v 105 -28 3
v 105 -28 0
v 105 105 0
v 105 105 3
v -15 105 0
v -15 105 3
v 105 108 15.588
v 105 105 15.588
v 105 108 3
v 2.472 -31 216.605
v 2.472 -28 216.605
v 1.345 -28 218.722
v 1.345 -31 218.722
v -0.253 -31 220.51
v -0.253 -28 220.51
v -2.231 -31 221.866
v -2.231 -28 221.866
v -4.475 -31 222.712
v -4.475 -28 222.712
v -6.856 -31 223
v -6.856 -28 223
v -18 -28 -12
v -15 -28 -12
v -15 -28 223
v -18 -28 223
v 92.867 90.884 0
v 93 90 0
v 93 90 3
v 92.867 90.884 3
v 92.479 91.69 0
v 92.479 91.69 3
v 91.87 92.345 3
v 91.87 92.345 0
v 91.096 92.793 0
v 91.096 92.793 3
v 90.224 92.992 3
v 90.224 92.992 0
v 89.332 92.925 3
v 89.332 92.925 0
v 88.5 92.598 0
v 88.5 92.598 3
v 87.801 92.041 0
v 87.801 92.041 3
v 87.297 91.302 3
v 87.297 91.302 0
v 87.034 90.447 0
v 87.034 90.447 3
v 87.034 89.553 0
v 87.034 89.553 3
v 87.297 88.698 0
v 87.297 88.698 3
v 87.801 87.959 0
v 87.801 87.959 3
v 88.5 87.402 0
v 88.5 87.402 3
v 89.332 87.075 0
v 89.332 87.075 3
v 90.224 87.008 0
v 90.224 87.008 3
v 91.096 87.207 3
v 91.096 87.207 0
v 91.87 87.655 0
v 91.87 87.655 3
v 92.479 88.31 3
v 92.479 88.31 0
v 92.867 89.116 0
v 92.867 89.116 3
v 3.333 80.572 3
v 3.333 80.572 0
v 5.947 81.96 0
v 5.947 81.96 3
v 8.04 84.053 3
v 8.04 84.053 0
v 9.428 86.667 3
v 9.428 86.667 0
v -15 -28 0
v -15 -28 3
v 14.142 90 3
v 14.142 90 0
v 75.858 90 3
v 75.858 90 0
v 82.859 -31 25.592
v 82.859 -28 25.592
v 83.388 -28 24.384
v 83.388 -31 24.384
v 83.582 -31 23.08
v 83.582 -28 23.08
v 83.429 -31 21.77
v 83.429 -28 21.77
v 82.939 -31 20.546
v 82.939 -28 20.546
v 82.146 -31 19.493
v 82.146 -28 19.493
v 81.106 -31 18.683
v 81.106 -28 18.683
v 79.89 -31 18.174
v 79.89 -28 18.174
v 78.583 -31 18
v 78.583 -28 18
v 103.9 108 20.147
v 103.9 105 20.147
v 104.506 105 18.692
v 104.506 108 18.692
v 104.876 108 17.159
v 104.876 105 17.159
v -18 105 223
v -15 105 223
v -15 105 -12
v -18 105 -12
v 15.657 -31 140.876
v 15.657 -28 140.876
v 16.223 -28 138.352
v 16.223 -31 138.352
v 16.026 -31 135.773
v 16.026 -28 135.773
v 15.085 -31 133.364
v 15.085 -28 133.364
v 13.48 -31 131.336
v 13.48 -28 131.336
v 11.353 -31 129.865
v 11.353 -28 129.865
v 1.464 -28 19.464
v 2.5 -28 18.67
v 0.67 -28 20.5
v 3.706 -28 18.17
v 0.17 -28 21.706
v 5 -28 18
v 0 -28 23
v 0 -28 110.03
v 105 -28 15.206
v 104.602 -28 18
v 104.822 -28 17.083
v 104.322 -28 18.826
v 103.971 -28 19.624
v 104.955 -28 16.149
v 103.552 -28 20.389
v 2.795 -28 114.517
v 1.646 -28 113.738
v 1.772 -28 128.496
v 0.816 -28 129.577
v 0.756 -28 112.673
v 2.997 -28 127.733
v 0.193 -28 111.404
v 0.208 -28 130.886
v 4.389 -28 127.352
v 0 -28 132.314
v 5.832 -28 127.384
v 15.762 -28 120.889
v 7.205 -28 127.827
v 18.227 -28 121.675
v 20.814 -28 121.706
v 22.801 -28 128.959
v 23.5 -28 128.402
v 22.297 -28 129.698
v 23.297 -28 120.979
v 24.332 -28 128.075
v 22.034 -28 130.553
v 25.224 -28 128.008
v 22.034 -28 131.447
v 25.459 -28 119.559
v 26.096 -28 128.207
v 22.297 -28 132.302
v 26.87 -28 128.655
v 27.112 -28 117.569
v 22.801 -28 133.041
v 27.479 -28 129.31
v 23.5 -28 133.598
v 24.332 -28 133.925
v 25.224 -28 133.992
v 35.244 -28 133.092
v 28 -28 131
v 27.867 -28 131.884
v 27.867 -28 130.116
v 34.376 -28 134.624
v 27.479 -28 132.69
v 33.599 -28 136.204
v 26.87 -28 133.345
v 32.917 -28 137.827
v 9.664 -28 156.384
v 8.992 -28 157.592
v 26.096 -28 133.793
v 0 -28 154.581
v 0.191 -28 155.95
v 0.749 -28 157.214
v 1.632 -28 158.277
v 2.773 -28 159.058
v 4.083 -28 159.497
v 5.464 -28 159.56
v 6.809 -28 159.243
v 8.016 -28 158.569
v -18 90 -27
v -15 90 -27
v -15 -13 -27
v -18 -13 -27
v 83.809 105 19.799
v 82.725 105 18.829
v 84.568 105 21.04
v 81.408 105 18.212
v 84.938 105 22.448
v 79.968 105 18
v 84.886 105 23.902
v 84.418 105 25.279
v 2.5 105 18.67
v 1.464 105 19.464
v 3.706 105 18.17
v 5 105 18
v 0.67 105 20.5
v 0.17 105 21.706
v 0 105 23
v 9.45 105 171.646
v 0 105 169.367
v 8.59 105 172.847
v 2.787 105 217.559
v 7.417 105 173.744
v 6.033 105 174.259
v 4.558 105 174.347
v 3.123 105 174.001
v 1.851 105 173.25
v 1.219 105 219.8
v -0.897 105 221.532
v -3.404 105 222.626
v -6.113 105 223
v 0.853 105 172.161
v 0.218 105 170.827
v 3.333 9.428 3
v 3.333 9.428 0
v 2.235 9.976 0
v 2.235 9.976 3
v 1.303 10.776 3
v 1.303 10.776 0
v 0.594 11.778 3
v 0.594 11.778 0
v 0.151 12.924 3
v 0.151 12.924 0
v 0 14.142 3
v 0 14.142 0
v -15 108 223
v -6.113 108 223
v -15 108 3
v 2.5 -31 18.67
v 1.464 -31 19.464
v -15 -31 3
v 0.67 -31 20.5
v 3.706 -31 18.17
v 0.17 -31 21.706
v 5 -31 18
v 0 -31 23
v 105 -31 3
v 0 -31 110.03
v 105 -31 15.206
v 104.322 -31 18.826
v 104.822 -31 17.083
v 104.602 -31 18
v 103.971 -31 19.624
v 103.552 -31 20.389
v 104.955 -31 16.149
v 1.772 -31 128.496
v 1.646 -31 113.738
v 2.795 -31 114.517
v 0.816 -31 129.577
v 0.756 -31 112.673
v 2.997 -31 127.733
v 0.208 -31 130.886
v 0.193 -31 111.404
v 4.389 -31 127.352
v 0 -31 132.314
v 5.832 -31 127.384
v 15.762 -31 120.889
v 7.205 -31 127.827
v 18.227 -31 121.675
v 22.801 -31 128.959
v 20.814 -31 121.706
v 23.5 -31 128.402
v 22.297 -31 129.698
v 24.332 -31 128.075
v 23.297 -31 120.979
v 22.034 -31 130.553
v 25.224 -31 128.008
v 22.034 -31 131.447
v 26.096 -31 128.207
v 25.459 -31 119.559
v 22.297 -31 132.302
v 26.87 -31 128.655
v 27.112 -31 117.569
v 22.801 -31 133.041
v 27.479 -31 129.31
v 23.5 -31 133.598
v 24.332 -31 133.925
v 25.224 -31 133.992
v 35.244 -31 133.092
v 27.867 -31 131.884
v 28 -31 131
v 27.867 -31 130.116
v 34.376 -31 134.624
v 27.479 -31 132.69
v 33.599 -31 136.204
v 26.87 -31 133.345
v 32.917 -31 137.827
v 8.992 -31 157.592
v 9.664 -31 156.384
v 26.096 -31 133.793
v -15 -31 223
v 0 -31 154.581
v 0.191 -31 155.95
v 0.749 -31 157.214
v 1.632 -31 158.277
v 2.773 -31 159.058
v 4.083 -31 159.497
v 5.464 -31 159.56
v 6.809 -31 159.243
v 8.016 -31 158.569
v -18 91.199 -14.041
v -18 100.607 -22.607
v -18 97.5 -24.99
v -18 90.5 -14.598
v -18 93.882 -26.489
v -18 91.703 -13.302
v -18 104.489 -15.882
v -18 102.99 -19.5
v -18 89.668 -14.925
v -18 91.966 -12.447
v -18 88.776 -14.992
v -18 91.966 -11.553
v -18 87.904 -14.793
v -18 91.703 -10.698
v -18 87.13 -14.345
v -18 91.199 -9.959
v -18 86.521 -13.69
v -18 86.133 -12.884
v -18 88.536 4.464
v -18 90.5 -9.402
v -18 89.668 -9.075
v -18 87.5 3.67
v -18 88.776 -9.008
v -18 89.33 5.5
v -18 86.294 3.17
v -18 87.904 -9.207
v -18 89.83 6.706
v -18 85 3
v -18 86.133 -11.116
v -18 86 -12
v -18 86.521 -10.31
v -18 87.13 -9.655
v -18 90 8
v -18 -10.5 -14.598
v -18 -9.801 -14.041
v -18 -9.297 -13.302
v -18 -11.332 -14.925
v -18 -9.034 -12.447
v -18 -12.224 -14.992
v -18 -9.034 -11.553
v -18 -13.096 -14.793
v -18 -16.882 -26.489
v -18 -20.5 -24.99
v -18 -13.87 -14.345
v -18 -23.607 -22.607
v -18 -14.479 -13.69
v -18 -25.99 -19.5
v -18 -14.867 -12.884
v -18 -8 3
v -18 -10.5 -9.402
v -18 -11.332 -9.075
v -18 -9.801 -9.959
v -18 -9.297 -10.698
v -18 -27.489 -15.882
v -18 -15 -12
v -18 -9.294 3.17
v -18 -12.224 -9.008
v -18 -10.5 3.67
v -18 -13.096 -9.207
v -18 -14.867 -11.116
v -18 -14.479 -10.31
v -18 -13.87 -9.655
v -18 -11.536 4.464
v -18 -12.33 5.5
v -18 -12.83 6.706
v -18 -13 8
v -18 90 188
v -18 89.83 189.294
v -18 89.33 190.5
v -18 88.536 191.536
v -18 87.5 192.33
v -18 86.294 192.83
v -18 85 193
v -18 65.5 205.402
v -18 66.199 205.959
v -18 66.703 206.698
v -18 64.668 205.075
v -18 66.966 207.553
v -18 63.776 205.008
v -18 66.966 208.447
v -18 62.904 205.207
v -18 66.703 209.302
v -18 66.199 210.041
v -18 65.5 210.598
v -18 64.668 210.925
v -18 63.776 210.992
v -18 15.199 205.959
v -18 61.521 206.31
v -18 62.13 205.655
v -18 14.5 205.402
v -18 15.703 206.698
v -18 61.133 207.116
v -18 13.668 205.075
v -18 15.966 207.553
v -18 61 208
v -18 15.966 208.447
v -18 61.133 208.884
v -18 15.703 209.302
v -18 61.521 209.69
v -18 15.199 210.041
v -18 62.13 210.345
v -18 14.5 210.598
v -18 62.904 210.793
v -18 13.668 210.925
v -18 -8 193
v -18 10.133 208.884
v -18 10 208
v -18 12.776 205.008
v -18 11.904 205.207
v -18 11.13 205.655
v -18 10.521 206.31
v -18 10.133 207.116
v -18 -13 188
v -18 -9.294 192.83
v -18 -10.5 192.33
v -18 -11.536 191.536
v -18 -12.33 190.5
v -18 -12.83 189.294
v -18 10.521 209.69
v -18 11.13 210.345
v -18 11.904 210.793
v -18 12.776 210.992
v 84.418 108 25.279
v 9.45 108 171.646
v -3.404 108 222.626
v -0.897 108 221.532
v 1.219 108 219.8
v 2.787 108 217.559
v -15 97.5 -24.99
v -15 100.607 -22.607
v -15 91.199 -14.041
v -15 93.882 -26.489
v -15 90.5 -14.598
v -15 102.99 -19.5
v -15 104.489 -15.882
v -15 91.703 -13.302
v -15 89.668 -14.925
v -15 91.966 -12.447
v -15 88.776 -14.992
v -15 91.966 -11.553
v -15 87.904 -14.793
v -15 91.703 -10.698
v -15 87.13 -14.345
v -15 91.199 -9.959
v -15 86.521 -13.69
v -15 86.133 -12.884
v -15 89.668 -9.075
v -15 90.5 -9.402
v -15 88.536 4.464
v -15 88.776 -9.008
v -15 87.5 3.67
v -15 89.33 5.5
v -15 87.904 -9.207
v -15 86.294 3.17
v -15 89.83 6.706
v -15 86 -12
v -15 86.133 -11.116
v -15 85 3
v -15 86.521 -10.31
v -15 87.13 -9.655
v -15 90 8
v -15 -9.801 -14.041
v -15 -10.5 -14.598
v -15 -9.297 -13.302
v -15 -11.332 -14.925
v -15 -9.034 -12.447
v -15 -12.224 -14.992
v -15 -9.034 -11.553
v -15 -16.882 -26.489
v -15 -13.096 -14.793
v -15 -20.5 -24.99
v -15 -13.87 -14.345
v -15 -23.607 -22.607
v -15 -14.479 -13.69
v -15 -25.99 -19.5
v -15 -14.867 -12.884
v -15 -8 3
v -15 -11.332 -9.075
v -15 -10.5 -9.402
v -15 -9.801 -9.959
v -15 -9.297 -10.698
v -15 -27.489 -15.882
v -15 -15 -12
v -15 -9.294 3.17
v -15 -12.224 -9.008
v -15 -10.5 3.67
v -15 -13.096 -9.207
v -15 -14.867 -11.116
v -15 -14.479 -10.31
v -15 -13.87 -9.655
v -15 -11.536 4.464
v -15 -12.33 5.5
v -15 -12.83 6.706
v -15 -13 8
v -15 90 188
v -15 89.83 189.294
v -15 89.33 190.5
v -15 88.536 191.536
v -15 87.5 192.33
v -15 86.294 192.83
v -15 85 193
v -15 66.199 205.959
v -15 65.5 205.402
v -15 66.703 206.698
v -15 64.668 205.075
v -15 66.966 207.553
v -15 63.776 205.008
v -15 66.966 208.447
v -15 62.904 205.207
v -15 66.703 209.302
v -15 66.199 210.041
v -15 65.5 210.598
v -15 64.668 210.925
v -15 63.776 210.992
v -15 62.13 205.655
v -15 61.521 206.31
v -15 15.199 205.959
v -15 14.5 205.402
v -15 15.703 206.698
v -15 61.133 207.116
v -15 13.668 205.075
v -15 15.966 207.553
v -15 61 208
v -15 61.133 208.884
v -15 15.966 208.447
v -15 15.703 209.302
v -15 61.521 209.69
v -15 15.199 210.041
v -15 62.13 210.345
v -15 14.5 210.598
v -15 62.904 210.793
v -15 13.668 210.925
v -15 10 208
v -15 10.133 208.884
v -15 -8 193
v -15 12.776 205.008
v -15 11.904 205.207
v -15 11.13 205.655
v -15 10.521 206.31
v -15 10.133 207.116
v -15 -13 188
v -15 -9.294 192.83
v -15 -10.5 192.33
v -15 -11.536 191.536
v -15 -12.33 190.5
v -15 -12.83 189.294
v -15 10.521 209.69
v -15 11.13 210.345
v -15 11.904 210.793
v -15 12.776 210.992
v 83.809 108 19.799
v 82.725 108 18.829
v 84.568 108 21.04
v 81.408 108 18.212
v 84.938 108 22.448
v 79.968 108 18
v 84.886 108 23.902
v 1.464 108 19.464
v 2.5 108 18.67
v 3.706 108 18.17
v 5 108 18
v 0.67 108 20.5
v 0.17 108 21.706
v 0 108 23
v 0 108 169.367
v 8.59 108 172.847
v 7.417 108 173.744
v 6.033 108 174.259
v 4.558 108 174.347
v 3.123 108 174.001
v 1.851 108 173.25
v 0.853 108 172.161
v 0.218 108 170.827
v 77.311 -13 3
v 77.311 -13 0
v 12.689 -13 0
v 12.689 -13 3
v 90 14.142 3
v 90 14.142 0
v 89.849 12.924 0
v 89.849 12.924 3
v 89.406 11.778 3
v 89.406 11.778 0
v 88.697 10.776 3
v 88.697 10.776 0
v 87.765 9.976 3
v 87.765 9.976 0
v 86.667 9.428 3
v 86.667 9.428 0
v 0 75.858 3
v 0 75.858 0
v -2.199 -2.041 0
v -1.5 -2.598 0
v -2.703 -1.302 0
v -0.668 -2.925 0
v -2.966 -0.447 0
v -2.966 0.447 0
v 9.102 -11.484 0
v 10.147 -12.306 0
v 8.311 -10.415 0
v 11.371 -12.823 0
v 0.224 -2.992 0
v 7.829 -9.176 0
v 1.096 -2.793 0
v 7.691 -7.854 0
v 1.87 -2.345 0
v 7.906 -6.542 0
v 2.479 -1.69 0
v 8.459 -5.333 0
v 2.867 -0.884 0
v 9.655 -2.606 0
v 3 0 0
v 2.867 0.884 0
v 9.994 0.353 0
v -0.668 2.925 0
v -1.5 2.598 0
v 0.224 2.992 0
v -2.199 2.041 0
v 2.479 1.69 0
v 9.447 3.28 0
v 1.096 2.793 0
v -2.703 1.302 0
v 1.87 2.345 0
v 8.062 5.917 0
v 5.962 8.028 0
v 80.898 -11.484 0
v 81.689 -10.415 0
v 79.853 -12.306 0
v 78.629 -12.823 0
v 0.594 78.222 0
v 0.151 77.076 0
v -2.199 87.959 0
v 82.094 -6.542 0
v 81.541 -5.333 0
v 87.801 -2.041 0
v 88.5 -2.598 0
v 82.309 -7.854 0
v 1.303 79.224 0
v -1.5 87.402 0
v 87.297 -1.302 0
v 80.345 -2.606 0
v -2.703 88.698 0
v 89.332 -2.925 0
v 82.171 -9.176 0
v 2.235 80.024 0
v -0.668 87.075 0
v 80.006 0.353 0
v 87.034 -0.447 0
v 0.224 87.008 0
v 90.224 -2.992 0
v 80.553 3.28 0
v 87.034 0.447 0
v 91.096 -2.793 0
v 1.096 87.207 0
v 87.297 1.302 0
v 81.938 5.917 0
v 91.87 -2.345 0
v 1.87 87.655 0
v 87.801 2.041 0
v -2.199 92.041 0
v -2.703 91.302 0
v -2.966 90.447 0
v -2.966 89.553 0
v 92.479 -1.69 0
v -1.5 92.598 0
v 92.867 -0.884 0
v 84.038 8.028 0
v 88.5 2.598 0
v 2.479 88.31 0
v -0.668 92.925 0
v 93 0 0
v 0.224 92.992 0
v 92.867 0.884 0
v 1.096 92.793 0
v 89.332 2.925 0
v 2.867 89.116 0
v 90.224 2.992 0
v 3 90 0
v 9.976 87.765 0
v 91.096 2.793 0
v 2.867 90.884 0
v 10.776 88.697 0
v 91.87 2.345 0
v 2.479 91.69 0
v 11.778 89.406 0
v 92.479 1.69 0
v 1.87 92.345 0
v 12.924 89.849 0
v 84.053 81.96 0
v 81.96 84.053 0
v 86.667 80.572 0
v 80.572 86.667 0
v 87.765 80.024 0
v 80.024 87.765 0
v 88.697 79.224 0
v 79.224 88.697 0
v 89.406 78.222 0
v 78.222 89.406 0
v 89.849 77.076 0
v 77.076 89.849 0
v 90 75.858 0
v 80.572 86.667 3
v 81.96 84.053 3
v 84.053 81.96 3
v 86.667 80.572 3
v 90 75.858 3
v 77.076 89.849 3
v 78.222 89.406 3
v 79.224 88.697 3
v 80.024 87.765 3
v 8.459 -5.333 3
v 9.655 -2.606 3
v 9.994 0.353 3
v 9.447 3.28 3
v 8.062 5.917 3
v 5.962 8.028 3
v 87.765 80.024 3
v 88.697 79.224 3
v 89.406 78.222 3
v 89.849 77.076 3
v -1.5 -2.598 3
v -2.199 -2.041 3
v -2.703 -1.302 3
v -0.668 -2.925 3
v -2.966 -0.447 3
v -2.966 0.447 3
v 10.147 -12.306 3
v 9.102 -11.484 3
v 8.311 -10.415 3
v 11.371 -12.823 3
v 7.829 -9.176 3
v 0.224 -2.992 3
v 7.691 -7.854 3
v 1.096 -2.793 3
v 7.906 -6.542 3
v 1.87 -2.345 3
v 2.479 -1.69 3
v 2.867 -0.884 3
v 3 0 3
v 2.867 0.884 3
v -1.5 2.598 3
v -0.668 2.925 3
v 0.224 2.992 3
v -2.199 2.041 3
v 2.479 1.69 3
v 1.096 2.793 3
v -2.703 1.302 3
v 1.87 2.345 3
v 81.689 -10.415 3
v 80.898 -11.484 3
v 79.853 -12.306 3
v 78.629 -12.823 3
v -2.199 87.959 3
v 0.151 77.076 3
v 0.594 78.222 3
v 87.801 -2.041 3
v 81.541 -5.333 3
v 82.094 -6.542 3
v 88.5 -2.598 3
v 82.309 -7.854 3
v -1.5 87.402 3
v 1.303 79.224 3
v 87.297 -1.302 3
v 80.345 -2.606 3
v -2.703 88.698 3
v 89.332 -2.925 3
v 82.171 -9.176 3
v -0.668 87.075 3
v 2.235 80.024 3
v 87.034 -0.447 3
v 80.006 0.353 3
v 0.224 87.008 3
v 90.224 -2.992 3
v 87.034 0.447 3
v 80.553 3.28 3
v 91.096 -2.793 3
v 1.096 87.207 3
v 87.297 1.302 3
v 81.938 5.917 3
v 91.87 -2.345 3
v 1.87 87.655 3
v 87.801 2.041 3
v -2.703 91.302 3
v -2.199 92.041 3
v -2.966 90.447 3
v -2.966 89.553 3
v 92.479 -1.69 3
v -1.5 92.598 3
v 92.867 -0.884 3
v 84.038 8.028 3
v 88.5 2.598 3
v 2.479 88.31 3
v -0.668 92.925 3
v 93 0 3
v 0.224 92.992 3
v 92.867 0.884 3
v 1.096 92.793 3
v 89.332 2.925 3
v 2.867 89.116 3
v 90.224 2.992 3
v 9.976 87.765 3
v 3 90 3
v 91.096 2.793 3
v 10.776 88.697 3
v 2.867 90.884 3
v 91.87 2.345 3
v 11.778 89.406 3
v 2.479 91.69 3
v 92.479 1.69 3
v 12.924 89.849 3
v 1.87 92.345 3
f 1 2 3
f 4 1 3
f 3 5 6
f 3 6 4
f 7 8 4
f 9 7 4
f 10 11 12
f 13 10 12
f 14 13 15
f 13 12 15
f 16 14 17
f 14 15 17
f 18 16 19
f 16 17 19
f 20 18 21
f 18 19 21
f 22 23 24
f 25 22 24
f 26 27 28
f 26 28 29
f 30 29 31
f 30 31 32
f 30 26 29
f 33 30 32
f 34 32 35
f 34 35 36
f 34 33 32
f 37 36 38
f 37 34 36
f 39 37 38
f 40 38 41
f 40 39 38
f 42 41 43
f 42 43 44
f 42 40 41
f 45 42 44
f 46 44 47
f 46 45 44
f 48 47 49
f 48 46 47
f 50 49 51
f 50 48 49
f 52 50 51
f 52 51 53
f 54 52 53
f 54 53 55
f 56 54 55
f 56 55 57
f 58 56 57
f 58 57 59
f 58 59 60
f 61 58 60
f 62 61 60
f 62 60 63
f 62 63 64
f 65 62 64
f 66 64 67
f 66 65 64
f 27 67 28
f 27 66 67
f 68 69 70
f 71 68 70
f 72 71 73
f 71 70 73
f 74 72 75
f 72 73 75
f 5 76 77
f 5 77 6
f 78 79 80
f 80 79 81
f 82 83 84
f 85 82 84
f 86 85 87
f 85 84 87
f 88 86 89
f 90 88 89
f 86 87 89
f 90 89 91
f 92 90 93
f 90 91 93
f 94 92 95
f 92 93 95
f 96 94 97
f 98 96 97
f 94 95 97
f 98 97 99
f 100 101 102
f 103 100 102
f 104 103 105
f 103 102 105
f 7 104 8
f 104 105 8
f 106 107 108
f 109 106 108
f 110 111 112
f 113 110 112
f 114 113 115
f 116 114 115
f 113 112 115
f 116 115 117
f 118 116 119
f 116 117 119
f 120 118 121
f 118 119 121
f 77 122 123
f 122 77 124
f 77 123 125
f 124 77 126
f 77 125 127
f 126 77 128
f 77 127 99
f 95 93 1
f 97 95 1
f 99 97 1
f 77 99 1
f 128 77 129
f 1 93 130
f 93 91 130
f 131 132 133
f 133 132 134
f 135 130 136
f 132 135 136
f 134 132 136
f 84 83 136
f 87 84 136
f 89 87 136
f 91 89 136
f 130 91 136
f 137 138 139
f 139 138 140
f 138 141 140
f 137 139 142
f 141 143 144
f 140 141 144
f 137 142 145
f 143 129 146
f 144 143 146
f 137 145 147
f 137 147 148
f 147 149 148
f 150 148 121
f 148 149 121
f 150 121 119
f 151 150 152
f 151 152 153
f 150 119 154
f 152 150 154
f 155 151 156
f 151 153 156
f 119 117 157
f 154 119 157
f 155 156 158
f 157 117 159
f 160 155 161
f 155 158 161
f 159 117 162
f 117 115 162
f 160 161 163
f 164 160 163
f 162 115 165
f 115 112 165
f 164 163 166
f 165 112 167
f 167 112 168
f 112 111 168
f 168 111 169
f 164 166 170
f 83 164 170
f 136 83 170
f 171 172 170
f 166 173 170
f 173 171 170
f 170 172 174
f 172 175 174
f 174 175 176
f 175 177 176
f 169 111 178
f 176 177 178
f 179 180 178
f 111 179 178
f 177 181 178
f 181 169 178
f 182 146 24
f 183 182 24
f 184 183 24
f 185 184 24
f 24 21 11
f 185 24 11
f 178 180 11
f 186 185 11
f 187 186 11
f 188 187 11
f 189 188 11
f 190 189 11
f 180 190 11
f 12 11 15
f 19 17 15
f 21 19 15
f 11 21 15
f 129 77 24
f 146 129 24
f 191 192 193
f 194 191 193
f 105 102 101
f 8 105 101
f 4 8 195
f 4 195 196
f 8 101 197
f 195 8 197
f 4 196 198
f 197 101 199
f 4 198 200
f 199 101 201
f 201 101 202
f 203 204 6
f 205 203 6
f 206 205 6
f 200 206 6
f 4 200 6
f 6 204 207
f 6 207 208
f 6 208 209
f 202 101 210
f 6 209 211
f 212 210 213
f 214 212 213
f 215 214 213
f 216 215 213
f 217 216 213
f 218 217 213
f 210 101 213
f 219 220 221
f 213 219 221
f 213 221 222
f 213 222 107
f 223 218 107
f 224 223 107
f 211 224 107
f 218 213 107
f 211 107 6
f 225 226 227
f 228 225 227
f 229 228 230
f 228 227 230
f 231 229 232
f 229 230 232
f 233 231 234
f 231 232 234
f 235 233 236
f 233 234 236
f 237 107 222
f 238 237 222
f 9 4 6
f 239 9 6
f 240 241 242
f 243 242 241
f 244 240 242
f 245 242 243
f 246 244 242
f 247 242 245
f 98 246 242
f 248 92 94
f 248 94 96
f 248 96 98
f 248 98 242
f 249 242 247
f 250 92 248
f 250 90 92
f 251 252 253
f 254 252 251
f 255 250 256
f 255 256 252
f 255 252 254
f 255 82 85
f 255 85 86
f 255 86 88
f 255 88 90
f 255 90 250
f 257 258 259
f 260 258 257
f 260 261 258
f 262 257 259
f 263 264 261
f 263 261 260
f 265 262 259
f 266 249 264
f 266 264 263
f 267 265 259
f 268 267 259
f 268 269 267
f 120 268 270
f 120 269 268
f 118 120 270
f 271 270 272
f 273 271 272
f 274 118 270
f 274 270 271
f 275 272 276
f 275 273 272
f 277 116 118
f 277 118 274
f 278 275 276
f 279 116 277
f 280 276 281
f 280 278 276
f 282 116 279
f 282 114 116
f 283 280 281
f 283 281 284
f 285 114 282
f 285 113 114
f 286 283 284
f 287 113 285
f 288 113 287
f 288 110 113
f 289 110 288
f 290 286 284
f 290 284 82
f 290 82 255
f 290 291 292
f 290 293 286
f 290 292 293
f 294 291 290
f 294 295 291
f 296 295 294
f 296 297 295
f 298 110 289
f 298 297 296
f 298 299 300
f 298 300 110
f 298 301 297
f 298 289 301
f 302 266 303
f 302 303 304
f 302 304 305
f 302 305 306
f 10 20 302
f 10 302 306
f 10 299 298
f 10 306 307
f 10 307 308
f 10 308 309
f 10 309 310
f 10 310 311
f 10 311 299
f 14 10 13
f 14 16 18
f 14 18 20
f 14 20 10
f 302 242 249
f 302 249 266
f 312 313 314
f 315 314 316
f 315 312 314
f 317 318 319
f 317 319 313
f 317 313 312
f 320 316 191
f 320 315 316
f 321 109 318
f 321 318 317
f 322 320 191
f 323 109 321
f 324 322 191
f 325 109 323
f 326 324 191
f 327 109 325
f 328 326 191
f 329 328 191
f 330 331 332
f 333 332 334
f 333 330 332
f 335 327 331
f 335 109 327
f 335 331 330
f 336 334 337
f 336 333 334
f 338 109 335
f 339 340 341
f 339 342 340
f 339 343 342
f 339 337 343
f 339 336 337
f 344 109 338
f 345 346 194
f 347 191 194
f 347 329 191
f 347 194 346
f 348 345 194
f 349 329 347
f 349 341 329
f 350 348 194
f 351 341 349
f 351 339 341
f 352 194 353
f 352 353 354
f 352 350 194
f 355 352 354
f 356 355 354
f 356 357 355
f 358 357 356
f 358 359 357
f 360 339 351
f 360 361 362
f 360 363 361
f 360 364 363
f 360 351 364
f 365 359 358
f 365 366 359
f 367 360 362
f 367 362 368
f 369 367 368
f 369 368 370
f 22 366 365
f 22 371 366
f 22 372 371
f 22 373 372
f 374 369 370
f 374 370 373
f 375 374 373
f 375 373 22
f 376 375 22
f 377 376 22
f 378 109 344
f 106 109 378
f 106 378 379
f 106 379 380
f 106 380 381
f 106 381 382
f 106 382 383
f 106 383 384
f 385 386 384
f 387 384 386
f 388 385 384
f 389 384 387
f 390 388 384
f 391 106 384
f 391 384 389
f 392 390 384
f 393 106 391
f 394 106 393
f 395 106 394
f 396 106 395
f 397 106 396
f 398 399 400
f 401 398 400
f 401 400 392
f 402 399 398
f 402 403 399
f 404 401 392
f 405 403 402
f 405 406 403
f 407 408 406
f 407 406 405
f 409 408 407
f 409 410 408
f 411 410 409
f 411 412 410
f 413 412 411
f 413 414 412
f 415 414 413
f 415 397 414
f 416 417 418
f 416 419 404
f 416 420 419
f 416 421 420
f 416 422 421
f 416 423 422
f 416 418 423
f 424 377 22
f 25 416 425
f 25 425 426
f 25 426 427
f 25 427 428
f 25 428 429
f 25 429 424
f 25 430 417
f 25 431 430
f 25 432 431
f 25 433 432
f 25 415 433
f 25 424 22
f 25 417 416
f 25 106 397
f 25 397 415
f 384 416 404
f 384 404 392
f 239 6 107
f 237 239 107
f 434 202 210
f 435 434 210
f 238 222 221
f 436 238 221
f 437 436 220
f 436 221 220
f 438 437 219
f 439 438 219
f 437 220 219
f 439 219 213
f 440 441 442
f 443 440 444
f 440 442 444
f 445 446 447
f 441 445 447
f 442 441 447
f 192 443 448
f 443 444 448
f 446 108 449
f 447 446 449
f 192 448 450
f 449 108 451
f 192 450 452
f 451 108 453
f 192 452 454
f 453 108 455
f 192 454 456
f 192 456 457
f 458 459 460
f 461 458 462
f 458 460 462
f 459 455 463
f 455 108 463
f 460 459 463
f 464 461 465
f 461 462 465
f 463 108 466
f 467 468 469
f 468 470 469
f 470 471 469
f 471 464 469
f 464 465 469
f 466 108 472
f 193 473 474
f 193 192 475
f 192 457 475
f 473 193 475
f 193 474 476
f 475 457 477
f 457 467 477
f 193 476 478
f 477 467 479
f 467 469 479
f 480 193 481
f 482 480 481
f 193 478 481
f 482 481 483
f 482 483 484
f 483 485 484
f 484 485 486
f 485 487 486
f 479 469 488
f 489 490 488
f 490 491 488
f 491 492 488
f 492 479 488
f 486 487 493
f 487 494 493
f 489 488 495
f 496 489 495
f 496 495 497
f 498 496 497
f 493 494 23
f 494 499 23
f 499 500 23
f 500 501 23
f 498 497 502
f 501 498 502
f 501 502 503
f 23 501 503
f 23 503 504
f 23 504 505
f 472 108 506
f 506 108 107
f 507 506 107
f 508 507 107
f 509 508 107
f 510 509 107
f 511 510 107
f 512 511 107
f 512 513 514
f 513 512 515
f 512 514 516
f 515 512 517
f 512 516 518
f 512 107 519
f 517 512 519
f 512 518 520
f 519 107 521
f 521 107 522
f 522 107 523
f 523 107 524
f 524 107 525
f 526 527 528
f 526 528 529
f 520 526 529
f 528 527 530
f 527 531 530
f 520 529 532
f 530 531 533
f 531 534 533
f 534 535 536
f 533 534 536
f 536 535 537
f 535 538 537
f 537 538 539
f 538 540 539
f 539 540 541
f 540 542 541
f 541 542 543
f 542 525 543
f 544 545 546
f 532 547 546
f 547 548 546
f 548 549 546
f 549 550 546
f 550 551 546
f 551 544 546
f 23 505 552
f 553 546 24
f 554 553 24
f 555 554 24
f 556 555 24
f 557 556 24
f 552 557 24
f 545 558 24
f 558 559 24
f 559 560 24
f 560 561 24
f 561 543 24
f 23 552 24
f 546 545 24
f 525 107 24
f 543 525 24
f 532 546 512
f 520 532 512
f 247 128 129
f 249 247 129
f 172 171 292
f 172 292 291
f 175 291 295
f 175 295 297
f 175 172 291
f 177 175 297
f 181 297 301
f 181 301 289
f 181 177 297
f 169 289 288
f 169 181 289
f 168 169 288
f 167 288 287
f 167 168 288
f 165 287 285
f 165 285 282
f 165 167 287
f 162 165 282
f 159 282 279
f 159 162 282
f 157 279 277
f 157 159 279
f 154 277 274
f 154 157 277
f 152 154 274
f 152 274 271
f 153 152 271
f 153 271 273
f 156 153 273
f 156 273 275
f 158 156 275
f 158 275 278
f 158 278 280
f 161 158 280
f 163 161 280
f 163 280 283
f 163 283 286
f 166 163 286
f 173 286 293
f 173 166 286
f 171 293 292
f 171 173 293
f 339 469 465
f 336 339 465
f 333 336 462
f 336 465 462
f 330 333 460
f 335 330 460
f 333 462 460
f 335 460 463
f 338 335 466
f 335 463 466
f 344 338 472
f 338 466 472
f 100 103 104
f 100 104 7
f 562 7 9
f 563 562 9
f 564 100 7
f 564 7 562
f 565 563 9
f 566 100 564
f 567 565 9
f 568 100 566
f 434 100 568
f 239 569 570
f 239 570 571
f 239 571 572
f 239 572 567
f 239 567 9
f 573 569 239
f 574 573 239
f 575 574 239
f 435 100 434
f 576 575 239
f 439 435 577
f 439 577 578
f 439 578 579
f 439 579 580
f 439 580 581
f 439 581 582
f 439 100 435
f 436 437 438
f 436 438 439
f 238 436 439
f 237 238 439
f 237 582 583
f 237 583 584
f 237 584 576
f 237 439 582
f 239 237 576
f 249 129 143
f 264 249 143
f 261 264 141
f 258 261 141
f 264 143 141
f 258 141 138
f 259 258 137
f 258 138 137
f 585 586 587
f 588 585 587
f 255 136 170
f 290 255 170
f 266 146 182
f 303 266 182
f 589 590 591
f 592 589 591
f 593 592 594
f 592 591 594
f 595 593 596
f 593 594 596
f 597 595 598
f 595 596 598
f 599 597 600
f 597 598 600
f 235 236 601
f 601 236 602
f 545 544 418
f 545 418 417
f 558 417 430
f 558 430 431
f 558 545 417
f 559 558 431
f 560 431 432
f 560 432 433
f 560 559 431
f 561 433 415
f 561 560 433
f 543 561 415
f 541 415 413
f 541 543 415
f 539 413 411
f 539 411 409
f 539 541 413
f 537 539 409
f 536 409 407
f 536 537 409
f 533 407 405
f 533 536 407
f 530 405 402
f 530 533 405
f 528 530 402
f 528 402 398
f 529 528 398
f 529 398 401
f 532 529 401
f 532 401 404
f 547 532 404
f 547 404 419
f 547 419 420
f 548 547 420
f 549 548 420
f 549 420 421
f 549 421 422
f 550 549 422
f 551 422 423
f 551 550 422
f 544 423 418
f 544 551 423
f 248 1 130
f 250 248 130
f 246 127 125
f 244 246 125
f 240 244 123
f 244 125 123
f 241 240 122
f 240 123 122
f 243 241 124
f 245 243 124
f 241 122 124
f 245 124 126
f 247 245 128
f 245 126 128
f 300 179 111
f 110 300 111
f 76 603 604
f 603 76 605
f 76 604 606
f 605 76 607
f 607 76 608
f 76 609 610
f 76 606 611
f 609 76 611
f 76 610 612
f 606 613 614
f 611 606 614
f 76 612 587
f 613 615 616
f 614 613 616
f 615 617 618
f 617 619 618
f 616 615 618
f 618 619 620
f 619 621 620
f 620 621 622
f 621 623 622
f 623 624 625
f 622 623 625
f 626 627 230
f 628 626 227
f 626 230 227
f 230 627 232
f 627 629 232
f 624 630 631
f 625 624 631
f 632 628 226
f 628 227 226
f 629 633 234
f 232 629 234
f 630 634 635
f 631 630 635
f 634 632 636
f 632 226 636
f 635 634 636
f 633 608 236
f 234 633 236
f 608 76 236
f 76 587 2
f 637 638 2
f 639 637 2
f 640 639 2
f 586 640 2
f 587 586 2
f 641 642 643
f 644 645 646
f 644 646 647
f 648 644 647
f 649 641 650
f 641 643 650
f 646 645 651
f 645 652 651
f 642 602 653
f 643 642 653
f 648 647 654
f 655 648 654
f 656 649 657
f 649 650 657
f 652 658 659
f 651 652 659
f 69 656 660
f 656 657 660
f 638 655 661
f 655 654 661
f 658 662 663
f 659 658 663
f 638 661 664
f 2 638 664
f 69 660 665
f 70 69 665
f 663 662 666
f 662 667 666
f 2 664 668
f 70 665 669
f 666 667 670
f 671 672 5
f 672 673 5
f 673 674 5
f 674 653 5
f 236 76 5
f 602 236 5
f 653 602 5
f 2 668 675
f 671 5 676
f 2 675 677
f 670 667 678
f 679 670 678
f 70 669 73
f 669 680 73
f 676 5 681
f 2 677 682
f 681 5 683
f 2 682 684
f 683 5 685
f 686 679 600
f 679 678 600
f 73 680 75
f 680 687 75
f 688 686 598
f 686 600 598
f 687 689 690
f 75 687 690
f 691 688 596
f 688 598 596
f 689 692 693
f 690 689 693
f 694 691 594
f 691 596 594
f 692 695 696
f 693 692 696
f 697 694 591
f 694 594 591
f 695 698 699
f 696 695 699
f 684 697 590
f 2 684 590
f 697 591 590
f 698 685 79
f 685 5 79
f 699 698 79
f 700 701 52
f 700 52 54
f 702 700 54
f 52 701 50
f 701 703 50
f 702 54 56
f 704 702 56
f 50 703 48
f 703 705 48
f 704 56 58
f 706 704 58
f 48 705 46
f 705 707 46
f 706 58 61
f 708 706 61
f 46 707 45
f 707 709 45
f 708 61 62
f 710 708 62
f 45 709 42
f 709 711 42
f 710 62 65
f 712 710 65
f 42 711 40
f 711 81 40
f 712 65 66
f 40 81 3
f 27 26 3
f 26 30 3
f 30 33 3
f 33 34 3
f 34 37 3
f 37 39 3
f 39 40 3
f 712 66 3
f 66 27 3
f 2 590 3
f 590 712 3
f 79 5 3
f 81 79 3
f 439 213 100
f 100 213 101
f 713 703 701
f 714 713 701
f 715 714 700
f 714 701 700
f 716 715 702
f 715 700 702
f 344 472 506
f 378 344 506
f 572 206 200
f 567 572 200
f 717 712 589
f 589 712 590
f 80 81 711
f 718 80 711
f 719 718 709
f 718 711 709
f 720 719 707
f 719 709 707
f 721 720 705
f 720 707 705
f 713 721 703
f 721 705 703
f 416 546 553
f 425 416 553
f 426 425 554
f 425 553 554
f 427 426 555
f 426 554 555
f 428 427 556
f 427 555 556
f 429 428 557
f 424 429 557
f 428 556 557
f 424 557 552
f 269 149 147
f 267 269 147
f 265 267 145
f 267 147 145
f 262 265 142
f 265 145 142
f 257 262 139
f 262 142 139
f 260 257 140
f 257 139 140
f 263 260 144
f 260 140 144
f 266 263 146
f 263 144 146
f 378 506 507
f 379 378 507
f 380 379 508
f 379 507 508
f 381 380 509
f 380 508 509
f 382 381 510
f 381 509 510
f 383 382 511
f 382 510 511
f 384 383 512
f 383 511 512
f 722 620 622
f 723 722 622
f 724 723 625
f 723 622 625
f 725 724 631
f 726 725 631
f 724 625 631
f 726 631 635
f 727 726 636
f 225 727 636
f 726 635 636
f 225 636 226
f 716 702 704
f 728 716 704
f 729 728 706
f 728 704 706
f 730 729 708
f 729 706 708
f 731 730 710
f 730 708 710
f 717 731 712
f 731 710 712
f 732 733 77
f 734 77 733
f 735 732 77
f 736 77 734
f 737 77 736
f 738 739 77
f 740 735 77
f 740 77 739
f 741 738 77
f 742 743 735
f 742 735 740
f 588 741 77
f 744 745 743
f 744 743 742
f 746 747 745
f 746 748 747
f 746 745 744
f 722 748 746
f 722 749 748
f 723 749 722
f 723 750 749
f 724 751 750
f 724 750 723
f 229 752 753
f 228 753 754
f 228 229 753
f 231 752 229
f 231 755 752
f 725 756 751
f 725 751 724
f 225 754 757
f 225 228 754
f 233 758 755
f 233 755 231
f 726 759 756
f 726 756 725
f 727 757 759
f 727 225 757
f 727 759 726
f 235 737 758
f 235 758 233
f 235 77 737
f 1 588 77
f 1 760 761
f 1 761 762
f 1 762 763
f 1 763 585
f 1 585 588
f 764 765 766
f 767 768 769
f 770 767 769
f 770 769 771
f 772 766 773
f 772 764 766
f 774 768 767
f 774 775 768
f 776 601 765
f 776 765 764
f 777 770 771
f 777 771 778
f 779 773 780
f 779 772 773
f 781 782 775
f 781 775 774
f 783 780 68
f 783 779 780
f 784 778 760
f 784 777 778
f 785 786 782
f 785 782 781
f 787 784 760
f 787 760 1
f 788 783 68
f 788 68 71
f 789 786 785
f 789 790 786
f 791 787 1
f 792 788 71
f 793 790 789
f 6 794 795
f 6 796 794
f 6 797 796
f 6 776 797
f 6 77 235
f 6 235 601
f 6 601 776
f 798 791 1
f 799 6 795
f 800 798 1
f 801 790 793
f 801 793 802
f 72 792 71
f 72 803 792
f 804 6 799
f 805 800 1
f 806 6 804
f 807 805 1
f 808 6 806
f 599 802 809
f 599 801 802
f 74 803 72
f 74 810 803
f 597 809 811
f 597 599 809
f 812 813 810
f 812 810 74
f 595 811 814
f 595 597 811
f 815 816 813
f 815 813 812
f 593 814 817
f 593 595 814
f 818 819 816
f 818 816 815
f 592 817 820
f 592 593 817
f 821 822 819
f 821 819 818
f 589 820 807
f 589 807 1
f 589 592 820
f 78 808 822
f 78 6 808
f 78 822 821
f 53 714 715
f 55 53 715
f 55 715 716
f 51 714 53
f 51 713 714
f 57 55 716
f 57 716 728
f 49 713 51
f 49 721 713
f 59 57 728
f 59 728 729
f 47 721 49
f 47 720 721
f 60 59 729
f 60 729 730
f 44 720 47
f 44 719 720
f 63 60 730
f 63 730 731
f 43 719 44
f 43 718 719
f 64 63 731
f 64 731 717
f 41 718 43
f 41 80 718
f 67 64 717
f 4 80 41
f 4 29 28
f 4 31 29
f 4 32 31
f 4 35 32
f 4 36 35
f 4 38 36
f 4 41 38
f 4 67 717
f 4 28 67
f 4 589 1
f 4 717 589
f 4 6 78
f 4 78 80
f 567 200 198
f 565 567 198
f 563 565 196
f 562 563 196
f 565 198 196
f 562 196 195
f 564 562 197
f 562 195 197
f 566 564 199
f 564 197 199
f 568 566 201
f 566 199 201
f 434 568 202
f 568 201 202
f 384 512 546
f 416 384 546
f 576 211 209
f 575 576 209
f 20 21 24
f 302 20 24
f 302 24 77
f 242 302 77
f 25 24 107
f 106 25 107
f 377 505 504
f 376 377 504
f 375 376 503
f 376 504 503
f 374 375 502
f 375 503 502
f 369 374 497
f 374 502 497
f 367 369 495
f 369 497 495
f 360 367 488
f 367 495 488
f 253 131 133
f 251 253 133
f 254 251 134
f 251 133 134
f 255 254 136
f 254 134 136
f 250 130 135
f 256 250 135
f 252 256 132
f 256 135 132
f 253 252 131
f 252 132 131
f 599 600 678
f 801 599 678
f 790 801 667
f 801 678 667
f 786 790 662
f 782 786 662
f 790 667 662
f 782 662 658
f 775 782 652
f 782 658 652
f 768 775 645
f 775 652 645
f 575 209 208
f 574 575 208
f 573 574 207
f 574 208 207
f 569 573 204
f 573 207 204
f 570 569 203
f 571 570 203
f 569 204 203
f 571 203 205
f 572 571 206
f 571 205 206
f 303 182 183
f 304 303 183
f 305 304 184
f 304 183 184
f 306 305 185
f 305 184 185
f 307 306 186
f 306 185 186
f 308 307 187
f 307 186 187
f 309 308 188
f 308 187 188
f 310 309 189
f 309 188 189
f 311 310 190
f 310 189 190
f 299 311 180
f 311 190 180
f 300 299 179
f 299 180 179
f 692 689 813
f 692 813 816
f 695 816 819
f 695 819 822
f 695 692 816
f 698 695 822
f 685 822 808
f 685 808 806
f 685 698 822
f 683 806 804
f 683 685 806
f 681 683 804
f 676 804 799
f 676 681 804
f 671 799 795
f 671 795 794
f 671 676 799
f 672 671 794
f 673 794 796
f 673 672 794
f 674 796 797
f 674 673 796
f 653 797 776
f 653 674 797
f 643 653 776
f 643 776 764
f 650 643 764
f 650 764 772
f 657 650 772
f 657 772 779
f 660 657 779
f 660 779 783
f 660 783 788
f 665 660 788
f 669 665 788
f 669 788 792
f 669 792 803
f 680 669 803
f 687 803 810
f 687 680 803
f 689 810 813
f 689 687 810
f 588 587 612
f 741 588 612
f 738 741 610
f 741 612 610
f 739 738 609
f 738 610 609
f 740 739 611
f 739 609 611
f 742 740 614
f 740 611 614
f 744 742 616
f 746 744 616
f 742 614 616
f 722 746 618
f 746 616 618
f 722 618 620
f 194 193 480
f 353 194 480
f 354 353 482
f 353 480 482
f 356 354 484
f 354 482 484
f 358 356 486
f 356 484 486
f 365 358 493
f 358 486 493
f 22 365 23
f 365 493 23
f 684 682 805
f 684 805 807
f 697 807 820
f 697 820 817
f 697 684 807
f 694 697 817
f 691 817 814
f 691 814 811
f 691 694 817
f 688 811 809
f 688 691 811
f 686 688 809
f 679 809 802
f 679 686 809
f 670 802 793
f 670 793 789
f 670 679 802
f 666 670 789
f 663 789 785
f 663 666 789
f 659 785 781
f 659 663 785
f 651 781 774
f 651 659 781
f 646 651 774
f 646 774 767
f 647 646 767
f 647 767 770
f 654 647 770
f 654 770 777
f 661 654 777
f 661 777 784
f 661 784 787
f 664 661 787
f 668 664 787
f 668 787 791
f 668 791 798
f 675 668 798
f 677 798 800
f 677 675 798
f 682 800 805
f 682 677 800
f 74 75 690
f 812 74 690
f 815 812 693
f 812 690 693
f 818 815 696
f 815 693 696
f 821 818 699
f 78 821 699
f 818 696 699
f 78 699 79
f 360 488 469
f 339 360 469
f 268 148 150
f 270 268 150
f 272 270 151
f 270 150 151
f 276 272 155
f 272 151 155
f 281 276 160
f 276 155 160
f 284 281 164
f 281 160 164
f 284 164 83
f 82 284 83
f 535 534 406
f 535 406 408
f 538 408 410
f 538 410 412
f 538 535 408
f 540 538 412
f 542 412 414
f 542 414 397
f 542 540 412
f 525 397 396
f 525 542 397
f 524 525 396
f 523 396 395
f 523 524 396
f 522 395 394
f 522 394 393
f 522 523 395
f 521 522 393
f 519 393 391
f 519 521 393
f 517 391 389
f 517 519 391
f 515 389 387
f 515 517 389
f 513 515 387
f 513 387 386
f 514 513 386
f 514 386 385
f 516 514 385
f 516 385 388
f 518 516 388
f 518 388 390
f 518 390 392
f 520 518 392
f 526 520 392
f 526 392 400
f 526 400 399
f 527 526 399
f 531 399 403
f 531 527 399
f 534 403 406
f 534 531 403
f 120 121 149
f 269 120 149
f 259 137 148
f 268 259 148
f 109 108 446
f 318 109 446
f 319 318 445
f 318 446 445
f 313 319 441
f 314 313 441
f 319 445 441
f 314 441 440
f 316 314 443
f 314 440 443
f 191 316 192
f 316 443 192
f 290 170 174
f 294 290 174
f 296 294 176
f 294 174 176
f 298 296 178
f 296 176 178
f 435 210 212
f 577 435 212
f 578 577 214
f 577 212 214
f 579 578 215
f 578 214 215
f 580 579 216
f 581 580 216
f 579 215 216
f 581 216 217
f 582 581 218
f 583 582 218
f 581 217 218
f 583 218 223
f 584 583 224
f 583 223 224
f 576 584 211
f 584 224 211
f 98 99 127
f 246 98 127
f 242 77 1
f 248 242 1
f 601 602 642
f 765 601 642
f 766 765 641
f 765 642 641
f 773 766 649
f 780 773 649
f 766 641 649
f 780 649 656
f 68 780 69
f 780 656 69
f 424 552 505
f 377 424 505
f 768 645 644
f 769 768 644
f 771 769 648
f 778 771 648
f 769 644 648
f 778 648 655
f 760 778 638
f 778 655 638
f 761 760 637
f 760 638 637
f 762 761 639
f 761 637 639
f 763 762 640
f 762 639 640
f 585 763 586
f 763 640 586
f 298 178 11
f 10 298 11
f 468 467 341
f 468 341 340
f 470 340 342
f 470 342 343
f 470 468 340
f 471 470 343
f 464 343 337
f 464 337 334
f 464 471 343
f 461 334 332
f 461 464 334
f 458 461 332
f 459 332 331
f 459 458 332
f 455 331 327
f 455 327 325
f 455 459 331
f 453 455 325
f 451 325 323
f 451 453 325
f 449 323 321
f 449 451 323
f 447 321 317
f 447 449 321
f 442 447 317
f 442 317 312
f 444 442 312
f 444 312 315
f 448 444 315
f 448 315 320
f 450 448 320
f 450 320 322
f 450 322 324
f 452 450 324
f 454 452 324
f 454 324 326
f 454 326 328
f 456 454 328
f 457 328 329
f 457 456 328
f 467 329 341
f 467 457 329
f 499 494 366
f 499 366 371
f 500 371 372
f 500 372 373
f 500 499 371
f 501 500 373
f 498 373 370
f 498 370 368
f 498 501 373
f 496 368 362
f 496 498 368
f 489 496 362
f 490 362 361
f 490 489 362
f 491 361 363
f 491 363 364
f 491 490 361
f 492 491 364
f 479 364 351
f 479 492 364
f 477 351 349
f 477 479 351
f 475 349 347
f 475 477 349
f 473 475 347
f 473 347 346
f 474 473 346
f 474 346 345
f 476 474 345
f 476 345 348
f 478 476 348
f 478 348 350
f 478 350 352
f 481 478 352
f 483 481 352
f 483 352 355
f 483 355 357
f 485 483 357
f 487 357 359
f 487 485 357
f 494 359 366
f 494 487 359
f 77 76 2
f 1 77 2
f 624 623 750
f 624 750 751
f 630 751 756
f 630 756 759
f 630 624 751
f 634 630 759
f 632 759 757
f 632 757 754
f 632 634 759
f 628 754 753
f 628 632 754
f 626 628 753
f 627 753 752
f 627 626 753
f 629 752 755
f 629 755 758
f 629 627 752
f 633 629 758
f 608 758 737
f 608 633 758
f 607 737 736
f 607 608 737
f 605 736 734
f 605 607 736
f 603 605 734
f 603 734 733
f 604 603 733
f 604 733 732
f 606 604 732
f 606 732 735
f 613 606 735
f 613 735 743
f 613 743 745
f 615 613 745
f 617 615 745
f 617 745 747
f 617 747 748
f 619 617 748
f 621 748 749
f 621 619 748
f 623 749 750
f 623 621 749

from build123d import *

# Parameters (mm, degrees)
F0_W     = 120
F0_H     = 133
F0_R     = 3
F1_DEPTH = 3
F2_R     = 3
F3_DEPTH = 3
F5_DEPTH = 3
F6_R     = 3
F7_DEPTH = 3


with BuildPart() as f1:
    # F0 (on Top) → F1 (new body)
    with BuildSketch(Plane.XY):
        with Locations((45, 38.5)):
            Rectangle(F0_W, F0_H)
        Circle(F0_R, mode=Mode.SUBTRACT)
        with Locations((90, 0)):
            Circle(F0_R, mode=Mode.SUBTRACT)
        with BuildLine():
            ThreePointArc((0, 75.857864), (0.917517, 78.744616), (3.333333, 80.57191))
            ThreePointArc((3.333333, 80.57191), (7.071068, 82.928932), (9.42809, 86.666667))
            ThreePointArc((9.42809, 86.666667), (11.255384, 89.082483), (14.142136, 90))
            Line((14.142136, 90), (75.857864, 90))
            ThreePointArc((75.857864, 90), (78.744616, 89.082483), (80.57191, 86.666667))
            ThreePointArc((80.57191, 86.666667), (82.928932, 82.928932), (86.666667, 80.57191))
            ThreePointArc((86.666667, 80.57191), (89.082483, 78.744616), (90, 75.857864))
            Line((90, 75.857864), (90, 14.142136))
            ThreePointArc((90, 14.142136), (89.082483, 11.255384), (86.666667, 9.42809))
            ThreePointArc((86.666667, 9.42809), (80.553308, 3.280245), (81.540948, -5.333333))
            ThreePointArc((81.540948, -5.333333), (81.689398, -10.415229), (77.311422, -13))
            Line((77.311422, -13), (12.688578, -13))
            ThreePointArc((12.688578, -13), (8.310602, -10.415229), (8.459052, -5.333333))
            ThreePointArc((8.459052, -5.333333), (9.446692, 3.280245), (3.333333, 9.42809))
            ThreePointArc((3.333333, 9.42809), (0.917517, 11.255384), (0, 14.142136))
            Line((0, 14.142136), (0, 75.857864))
        make_face(mode=Mode.SUBTRACT)
        with Locations((0, 90)):
            Circle(F0_R, mode=Mode.SUBTRACT)
        with Locations((90, 90)):
            Circle(F0_R, mode=Mode.SUBTRACT)
    extrude(amount=F1_DEPTH)


with BuildPart() as f3:
    # F2 (on face) → F3 (new body)
    with BuildSketch(Plane(origin=(-15, 0, 0), x_dir=(0, -1, 0), z_dir=(-1, 0, 0))):
        with BuildLine():
            Line((28, 223), (-105, 223))
            Line((-105, 223), (-105, 3))
            Line((-105, 3), (-105, -12))
            ThreePointArc((-105, -12), (-100.606602, -22.606602), (-90, -27))
            Line((-90, -27), (13, -27))
            ThreePointArc((13, -27), (23.606602, -22.606602), (28, -12))
            Line((28, -12), (28, 3))
            Line((28, 3), (28, 223))
        make_face()
        with Locations((-89, -12)):
            Circle(F2_R, mode=Mode.SUBTRACT)
        with Locations((12, -12)):
            Circle(F2_R, mode=Mode.SUBTRACT)
        with BuildLine():
            Line((8, 3), (-85, 3))
            ThreePointArc((-85, 3), (-88.535534, 4.464466), (-90, 8))
            Line((-90, 8), (-90, 188))
            ThreePointArc((-90, 188), (-88.535534, 191.535534), (-85, 193))
            Line((-85, 193), (8, 193))
            ThreePointArc((8, 193), (11.535534, 191.535534), (13, 188))
            Line((13, 188), (13, 8))
            ThreePointArc((13, 8), (11.535534, 4.464466), (8, 3))
        make_face(mode=Mode.SUBTRACT)
        with Locations((-64, 208)):
            Circle(F2_R, mode=Mode.SUBTRACT)
        with Locations((-13, 208)):
            Circle(F2_R, mode=Mode.SUBTRACT)
    extrude(amount=F3_DEPTH)


with BuildPart() as f5:
    # F4 (on face) → F5 (new body)
    with BuildSketch(Plane(origin=(0, 105, 0), x_dir=(-1, 0, 0), z_dir=(0, 1, 0))):
        with BuildLine():
            Line((-105, 3), (15, 3))
            Line((15, 3), (15, 223))
            Line((15, 223), (6.113456, 223))
            ThreePointArc((6.113456, 223), (0.897499, 221.531928), (-2.786977, 217.558759))
            Line((-2.786977, 217.558759), (-103.900434, 20.146772))
            ThreePointArc((-103.900434, 20.146772), (-104.721223, 17.932759), (-105, 15.588014))
            Line((-105, 15.588014), (-105, 3))
        make_face()
        with BuildLine():
            Line((-5, 18), (-79.968209, 18))
            ThreePointArc((-79.968209, 18), (-84.234173, 20.392022), (-84.418426, 25.279379))
            Line((-84.418426, 25.279379), (-9.450217, 171.645883))
            ThreePointArc((-9.450217, 171.645883), (-3.827627, 174.227115), (0, 169.366504))
            Line((0, 169.366504), (0, 23))
            ThreePointArc((0, 23), (-1.464466, 19.464466), (-5, 18))
        make_face(mode=Mode.SUBTRACT)
    extrude(amount=F5_DEPTH)


with BuildPart() as f7:
    # F6 (on face) → F7 (new body)
    with BuildSketch(Plane.XZ.offset(28)):
        with BuildLine():
            Line((-15, 223), (-15, 3))
            Line((-15, 3), (105, 3))
            Line((105, 3), (105, 15.206102))
            ThreePointArc((105, 15.206102), (104.899944, 16.61717), (104.601778, 18))
            ThreePointArc((104.601778, 18), (104.155102, 19.22905), (103.551866, 20.389304))
            Line((103.551866, 20.389304), (35.244011, 133.091767))
            ThreePointArc((35.244011, 133.091767), (33.976028, 135.408053), (32.916642, 137.826867))
            Line((32.916642, 137.826867), (2.471523, 216.604835))
            ThreePointArc((2.471523, 216.604835), (-1.201416, 221.247677), (-6.856133, 223))
            Line((-6.856133, 223), (-15, 223))
        make_face()
        with BuildLine():
            ThreePointArc((0, 110.029648), (0.755836, 112.672955), (2.794828, 114.517099))
            Line((2.794828, 114.517099), (15.762277, 120.889413))
            ThreePointArc((15.762277, 120.889413), (22.082222, 121.434816), (27.111922, 117.56942))
            Line((27.111922, 117.56942), (82.858774, 25.591601))
            ThreePointArc((82.858774, 25.591601), (82.939331, 20.546228), (78.582841, 18))
            Line((78.582841, 18), (5, 18))
            ThreePointArc((5, 18), (1.464466, 19.464466), (0, 23))
            Line((0, 23), (0, 110.029648))
        make_face(mode=Mode.SUBTRACT)
        with BuildLine():
            Line((11.352975, 129.864827), (7.205172, 127.826561))
            ThreePointArc((7.205172, 127.826561), (2.356693, 128.069849), (0, 132.314013))
            Line((0, 132.314013), (0, 154.581261))
            ThreePointArc((0, 154.581261), (4.08325, 159.4965), (9.663828, 156.383679))
            Line((9.663828, 156.383679), (15.657094, 140.875861))
            ThreePointArc((15.657094, 140.875861), (15.644907, 134.533886), (11.352975, 129.864827))
        make_face(mode=Mode.SUBTRACT)
        with Locations((25, 131)):
            Circle(F6_R, mode=Mode.SUBTRACT)
    extrude(amount=F7_DEPTH)


solid = Compound([f1.part, f3.part, f5.part, f7.part])
